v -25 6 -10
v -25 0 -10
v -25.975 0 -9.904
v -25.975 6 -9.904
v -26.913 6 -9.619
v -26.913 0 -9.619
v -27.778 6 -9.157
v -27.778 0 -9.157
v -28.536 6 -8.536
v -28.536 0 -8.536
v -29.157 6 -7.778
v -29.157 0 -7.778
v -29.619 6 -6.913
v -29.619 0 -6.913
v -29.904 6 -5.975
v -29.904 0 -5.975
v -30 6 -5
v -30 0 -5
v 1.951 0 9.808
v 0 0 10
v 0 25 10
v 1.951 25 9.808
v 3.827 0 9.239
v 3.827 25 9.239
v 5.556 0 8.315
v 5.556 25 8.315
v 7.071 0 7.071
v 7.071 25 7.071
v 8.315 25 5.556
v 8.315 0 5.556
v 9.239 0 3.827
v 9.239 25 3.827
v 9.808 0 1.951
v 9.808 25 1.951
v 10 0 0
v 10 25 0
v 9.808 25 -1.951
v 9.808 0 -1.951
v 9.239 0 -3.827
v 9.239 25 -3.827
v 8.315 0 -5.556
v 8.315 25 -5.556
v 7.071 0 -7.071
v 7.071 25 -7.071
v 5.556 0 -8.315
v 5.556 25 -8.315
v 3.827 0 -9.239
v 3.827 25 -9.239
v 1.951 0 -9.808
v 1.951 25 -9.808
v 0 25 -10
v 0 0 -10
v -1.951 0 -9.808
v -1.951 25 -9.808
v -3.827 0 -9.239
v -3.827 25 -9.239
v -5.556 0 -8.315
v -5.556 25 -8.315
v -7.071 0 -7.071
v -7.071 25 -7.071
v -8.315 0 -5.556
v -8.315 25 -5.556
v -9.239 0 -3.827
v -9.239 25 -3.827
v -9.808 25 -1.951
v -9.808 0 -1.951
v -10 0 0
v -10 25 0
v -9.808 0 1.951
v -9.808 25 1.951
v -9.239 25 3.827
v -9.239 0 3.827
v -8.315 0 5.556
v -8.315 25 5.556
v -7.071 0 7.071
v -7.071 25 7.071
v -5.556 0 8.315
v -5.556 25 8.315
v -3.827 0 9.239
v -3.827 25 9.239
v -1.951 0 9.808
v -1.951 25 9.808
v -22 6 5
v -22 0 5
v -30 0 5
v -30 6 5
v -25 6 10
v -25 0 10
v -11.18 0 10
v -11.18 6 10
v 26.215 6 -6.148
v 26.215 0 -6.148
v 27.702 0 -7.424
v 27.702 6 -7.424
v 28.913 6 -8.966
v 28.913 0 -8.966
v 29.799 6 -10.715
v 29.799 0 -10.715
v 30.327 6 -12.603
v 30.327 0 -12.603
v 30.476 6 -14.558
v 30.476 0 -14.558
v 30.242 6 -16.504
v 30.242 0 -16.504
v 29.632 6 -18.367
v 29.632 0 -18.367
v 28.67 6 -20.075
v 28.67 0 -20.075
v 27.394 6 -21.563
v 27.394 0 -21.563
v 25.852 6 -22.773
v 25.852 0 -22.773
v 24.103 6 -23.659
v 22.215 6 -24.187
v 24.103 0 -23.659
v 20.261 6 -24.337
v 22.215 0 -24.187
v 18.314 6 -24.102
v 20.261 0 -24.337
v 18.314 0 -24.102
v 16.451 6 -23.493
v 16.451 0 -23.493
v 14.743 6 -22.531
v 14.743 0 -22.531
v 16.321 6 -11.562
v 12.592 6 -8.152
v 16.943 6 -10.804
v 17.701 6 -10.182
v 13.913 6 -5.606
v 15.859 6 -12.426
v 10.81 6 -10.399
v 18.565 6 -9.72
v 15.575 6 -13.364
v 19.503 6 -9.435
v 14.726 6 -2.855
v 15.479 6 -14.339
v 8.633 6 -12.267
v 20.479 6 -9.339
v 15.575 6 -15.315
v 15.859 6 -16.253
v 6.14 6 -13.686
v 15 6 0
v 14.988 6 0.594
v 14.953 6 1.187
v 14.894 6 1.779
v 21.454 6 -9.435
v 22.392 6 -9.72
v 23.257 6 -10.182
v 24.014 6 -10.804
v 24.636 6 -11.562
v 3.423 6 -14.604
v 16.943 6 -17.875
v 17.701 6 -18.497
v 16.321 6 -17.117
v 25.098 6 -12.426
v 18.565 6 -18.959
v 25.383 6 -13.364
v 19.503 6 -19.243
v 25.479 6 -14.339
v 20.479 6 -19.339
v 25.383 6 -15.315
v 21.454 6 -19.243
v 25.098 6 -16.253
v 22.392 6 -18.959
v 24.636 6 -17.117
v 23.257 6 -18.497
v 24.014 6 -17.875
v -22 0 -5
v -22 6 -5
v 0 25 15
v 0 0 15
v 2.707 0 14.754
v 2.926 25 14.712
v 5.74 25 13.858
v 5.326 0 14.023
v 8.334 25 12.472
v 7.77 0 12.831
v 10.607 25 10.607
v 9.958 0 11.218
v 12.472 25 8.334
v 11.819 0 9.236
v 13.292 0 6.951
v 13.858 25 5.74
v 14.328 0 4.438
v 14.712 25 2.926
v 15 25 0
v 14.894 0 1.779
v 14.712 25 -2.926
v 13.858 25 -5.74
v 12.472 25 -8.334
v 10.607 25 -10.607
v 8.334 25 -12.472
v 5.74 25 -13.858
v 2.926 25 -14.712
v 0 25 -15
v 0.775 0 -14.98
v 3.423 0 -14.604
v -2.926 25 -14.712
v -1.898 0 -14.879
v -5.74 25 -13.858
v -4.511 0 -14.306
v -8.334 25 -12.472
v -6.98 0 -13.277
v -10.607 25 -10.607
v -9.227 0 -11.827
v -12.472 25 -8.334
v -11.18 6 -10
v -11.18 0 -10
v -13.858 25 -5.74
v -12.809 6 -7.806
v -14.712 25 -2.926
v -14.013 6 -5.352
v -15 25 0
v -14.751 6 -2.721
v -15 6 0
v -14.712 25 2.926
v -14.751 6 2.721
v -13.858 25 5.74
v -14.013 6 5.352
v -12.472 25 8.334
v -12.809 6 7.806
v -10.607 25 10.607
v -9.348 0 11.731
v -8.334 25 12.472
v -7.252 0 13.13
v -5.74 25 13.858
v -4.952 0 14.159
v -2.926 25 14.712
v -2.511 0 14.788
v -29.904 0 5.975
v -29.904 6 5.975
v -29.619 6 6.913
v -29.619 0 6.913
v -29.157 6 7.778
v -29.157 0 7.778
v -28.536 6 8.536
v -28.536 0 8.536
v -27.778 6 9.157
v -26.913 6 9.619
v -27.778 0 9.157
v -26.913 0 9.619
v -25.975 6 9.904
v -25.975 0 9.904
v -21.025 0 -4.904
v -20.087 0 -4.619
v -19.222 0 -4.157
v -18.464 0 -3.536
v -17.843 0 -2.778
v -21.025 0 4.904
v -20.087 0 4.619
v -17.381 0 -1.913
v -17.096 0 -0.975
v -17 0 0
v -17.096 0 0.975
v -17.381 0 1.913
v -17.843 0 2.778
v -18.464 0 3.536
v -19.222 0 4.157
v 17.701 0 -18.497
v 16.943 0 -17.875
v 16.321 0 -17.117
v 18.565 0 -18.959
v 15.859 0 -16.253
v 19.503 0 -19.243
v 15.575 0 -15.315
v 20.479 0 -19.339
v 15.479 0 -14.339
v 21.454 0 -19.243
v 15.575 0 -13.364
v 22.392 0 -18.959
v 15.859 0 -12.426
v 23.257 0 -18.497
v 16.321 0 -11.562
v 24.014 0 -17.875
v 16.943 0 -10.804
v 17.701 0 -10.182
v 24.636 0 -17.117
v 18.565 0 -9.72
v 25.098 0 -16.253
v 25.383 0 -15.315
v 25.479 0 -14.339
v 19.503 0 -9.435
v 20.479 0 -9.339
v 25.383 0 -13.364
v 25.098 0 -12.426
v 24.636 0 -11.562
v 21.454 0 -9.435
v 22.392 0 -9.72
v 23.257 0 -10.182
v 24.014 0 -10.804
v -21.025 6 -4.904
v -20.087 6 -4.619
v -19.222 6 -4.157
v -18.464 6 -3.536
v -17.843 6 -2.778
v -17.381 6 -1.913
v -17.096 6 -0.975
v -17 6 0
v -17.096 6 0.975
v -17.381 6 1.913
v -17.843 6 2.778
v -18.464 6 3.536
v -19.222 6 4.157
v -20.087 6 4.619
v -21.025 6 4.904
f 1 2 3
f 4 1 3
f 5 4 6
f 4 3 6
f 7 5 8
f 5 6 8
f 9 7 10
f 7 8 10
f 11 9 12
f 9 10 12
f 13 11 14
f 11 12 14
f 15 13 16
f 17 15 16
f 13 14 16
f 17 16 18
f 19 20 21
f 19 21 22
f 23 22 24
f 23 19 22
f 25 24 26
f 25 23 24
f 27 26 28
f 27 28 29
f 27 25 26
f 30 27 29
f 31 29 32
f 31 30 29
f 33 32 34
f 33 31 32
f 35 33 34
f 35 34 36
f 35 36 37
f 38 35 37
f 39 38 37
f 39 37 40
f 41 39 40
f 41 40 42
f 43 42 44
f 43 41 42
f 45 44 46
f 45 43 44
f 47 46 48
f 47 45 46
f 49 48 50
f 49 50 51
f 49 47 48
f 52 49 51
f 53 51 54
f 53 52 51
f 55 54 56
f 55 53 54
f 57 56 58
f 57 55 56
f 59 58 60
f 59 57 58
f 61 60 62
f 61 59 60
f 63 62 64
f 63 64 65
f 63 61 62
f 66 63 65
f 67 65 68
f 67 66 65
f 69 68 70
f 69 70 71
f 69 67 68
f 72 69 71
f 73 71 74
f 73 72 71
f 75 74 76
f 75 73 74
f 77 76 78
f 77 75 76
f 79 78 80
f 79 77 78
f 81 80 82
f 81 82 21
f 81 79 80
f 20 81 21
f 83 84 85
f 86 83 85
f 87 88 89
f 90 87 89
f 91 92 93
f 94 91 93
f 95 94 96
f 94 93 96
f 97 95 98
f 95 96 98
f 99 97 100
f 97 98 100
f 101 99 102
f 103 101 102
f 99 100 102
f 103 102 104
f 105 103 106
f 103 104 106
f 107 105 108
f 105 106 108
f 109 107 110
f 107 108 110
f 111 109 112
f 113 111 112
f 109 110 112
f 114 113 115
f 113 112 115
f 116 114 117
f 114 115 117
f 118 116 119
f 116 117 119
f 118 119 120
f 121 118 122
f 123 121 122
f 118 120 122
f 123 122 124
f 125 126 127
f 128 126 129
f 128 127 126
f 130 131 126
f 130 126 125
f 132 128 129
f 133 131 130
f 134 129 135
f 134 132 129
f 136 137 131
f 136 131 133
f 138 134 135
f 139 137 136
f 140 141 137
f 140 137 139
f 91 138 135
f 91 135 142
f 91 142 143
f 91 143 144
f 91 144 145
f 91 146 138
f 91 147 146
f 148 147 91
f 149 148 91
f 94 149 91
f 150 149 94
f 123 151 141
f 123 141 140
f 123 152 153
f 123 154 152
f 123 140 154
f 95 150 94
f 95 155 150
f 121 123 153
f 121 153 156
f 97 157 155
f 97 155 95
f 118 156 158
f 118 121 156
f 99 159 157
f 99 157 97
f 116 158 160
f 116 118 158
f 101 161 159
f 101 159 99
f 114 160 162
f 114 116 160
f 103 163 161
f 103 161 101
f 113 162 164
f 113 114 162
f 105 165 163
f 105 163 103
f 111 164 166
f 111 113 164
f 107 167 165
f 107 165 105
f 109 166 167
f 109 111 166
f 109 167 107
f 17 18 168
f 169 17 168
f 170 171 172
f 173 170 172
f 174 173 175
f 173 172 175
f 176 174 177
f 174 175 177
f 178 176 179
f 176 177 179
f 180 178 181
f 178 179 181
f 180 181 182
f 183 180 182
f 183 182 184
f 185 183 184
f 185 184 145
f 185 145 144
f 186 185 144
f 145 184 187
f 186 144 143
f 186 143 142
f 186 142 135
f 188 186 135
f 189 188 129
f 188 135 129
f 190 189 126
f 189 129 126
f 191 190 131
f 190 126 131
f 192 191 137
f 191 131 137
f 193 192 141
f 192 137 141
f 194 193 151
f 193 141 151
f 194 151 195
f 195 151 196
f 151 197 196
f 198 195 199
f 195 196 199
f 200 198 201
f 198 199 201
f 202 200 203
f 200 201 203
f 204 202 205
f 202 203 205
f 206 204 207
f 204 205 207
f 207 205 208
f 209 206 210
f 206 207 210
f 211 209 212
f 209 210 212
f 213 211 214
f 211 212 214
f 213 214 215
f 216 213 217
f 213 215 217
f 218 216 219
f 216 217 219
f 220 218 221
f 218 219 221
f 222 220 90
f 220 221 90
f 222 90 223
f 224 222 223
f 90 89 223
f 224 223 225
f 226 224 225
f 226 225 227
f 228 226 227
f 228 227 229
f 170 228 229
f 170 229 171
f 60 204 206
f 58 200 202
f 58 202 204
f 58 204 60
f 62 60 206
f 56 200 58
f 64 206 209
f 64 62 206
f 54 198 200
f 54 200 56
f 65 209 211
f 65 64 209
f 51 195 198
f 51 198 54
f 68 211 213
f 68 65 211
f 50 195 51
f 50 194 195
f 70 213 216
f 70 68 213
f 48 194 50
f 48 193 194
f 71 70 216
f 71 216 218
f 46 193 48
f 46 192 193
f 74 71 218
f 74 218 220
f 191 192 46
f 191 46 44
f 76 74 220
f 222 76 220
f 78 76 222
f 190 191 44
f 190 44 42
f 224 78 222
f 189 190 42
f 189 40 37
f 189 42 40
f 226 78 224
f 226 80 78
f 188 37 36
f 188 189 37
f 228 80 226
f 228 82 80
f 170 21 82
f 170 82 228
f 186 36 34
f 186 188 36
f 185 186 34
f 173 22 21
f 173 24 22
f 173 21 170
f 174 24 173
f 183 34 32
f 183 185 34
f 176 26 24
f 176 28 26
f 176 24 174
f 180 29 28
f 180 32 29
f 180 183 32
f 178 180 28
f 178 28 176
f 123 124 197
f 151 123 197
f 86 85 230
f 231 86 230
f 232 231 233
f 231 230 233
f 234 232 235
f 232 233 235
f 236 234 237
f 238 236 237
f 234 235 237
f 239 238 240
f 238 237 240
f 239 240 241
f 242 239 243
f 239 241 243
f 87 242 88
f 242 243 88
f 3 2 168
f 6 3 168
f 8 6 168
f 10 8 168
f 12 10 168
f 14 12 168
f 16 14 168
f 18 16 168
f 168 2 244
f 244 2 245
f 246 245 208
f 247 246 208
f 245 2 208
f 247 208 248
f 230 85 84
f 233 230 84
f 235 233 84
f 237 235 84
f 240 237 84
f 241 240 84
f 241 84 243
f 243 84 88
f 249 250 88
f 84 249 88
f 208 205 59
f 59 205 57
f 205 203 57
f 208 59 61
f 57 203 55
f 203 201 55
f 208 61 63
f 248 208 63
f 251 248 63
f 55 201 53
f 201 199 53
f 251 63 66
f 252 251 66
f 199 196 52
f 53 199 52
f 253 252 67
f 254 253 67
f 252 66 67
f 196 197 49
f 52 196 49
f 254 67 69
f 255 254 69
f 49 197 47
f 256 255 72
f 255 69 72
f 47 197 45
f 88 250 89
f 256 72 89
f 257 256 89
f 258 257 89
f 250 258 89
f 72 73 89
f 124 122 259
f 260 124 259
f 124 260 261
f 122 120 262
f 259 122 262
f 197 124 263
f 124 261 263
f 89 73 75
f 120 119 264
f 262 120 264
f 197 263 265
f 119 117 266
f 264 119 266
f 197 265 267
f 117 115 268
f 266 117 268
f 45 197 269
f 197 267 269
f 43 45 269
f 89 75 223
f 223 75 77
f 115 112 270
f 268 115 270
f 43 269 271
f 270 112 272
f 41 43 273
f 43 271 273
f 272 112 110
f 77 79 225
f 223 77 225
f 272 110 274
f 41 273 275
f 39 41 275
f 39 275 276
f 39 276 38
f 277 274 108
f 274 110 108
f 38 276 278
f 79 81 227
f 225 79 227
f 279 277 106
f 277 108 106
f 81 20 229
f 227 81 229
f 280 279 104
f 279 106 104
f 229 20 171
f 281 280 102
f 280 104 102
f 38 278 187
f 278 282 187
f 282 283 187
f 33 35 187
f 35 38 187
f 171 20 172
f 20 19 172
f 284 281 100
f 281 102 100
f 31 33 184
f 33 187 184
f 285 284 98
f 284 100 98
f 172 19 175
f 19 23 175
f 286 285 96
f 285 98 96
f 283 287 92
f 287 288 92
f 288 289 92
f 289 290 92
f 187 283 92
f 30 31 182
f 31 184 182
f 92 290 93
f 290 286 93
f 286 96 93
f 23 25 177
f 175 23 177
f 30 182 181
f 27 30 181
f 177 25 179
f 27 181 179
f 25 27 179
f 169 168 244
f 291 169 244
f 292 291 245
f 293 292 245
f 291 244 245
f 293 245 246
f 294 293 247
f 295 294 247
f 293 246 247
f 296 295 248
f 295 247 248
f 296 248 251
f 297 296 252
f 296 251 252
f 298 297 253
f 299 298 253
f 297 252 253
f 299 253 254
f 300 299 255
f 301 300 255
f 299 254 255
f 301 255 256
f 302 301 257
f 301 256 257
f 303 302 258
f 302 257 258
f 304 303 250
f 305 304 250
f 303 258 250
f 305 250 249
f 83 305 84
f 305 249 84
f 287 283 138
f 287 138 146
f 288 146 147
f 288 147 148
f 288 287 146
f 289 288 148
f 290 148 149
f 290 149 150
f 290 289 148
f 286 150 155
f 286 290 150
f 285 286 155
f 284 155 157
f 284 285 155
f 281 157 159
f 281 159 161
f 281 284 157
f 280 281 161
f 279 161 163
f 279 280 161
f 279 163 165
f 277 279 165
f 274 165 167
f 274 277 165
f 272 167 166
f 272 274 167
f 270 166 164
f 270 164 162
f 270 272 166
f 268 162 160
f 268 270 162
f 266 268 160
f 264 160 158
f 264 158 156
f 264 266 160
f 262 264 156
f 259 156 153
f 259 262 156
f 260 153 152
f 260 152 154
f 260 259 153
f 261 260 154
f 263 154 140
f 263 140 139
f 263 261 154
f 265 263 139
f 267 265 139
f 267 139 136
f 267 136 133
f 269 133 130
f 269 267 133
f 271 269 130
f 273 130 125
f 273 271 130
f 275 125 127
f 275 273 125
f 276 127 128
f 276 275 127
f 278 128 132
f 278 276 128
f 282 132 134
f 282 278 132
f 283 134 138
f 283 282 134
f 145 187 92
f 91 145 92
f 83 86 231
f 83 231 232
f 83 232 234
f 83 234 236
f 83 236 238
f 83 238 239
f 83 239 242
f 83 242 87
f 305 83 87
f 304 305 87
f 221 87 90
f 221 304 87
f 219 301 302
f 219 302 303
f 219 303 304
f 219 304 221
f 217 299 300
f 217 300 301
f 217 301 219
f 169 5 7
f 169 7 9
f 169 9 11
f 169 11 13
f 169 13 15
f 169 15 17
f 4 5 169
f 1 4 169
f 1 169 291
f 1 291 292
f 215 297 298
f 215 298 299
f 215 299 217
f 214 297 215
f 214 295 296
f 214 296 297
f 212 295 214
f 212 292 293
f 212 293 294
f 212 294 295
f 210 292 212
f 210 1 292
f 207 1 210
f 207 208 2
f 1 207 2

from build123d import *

# Parameters (mm, degrees)
SKETCH_1_R      = 15
SKETCH_1_R_2    = 10
EXTRUDE_1_DEPTH = 25
SKETCH_2_R      = 5
EXTRUDE_2_DEPTH = 6


with BuildPart() as part:
    # 草圖1 → 伸長1 (new body)
    with BuildSketch(Plane(origin=(0, 0, 0), x_dir=(1, 0, 0), z_dir=(0, 1, 0))):
        with Locations(Location((0, 0, 0), (0, 0, 270))):
            Circle(SKETCH_1_R)
        with Locations(Location((0, 0, 0), (0, 0, 270))):
            Circle(SKETCH_1_R_2, mode=Mode.SUBTRACT)
    extrude(amount=EXTRUDE_1_DEPTH)

    # 草圖2 → 伸長2 (add)
    # profile 1 of 2: a face of its own
    with BuildSketch(Plane(origin=(0, 0, 0), x_dir=(1, 0, 0), z_dir=(0, 1, 0))):
        with BuildLine():
            ThreePointArc((-11.180339887, -10), (-15, 0), (-11.180339887, 10))
            Line((-11.180339887, 10), (-25, 10))
            ThreePointArc((-25, 10), (-28.535533906, 8.535533906), (-30, 5))
            Line((-30, 5), (-22, 5))
            ThreePointArc((-22, 5), (-17, 0), (-22, -5))
            Line((-22, -5), (-30, -5))
            ThreePointArc((-30, -5), (-28.535533906, -8.535533906), (-25, -10))
            Line((-25, -10), (-11.180339887, -10))
        make_face()
    # profile 2 of 2: a face of its own
    with BuildSketch(Plane(origin=(0, 0, 0), x_dir=(1, 0, 0), z_dir=(0, 1, 0))):
        with BuildLine():
            Line((14.743036744, 22.530931352), (3.422633911, 14.604299953))
            ThreePointArc((3.422633911, 14.604299953), (11.754563128, 9.318274822), (15, 0))
            ThreePointArc((15, 0), (14.973517282, -0.89094344), (14.894162638, -1.778740933))
            Line((14.894162638, -1.778740933), (26.214565471, 6.147890466))
            ThreePointArc((26.214565471, 6.147890466), (28.67032155, 20.075175272), (14.743036744, 22.530931352))
        make_face()
        with Locations(Location((20.478801107, 14.339410909, 0), (0, 0, 270))):
            Circle(SKETCH_2_R, mode=Mode.SUBTRACT)
    extrude(amount=EXTRUDE_2_DEPTH)


solid = part.part
